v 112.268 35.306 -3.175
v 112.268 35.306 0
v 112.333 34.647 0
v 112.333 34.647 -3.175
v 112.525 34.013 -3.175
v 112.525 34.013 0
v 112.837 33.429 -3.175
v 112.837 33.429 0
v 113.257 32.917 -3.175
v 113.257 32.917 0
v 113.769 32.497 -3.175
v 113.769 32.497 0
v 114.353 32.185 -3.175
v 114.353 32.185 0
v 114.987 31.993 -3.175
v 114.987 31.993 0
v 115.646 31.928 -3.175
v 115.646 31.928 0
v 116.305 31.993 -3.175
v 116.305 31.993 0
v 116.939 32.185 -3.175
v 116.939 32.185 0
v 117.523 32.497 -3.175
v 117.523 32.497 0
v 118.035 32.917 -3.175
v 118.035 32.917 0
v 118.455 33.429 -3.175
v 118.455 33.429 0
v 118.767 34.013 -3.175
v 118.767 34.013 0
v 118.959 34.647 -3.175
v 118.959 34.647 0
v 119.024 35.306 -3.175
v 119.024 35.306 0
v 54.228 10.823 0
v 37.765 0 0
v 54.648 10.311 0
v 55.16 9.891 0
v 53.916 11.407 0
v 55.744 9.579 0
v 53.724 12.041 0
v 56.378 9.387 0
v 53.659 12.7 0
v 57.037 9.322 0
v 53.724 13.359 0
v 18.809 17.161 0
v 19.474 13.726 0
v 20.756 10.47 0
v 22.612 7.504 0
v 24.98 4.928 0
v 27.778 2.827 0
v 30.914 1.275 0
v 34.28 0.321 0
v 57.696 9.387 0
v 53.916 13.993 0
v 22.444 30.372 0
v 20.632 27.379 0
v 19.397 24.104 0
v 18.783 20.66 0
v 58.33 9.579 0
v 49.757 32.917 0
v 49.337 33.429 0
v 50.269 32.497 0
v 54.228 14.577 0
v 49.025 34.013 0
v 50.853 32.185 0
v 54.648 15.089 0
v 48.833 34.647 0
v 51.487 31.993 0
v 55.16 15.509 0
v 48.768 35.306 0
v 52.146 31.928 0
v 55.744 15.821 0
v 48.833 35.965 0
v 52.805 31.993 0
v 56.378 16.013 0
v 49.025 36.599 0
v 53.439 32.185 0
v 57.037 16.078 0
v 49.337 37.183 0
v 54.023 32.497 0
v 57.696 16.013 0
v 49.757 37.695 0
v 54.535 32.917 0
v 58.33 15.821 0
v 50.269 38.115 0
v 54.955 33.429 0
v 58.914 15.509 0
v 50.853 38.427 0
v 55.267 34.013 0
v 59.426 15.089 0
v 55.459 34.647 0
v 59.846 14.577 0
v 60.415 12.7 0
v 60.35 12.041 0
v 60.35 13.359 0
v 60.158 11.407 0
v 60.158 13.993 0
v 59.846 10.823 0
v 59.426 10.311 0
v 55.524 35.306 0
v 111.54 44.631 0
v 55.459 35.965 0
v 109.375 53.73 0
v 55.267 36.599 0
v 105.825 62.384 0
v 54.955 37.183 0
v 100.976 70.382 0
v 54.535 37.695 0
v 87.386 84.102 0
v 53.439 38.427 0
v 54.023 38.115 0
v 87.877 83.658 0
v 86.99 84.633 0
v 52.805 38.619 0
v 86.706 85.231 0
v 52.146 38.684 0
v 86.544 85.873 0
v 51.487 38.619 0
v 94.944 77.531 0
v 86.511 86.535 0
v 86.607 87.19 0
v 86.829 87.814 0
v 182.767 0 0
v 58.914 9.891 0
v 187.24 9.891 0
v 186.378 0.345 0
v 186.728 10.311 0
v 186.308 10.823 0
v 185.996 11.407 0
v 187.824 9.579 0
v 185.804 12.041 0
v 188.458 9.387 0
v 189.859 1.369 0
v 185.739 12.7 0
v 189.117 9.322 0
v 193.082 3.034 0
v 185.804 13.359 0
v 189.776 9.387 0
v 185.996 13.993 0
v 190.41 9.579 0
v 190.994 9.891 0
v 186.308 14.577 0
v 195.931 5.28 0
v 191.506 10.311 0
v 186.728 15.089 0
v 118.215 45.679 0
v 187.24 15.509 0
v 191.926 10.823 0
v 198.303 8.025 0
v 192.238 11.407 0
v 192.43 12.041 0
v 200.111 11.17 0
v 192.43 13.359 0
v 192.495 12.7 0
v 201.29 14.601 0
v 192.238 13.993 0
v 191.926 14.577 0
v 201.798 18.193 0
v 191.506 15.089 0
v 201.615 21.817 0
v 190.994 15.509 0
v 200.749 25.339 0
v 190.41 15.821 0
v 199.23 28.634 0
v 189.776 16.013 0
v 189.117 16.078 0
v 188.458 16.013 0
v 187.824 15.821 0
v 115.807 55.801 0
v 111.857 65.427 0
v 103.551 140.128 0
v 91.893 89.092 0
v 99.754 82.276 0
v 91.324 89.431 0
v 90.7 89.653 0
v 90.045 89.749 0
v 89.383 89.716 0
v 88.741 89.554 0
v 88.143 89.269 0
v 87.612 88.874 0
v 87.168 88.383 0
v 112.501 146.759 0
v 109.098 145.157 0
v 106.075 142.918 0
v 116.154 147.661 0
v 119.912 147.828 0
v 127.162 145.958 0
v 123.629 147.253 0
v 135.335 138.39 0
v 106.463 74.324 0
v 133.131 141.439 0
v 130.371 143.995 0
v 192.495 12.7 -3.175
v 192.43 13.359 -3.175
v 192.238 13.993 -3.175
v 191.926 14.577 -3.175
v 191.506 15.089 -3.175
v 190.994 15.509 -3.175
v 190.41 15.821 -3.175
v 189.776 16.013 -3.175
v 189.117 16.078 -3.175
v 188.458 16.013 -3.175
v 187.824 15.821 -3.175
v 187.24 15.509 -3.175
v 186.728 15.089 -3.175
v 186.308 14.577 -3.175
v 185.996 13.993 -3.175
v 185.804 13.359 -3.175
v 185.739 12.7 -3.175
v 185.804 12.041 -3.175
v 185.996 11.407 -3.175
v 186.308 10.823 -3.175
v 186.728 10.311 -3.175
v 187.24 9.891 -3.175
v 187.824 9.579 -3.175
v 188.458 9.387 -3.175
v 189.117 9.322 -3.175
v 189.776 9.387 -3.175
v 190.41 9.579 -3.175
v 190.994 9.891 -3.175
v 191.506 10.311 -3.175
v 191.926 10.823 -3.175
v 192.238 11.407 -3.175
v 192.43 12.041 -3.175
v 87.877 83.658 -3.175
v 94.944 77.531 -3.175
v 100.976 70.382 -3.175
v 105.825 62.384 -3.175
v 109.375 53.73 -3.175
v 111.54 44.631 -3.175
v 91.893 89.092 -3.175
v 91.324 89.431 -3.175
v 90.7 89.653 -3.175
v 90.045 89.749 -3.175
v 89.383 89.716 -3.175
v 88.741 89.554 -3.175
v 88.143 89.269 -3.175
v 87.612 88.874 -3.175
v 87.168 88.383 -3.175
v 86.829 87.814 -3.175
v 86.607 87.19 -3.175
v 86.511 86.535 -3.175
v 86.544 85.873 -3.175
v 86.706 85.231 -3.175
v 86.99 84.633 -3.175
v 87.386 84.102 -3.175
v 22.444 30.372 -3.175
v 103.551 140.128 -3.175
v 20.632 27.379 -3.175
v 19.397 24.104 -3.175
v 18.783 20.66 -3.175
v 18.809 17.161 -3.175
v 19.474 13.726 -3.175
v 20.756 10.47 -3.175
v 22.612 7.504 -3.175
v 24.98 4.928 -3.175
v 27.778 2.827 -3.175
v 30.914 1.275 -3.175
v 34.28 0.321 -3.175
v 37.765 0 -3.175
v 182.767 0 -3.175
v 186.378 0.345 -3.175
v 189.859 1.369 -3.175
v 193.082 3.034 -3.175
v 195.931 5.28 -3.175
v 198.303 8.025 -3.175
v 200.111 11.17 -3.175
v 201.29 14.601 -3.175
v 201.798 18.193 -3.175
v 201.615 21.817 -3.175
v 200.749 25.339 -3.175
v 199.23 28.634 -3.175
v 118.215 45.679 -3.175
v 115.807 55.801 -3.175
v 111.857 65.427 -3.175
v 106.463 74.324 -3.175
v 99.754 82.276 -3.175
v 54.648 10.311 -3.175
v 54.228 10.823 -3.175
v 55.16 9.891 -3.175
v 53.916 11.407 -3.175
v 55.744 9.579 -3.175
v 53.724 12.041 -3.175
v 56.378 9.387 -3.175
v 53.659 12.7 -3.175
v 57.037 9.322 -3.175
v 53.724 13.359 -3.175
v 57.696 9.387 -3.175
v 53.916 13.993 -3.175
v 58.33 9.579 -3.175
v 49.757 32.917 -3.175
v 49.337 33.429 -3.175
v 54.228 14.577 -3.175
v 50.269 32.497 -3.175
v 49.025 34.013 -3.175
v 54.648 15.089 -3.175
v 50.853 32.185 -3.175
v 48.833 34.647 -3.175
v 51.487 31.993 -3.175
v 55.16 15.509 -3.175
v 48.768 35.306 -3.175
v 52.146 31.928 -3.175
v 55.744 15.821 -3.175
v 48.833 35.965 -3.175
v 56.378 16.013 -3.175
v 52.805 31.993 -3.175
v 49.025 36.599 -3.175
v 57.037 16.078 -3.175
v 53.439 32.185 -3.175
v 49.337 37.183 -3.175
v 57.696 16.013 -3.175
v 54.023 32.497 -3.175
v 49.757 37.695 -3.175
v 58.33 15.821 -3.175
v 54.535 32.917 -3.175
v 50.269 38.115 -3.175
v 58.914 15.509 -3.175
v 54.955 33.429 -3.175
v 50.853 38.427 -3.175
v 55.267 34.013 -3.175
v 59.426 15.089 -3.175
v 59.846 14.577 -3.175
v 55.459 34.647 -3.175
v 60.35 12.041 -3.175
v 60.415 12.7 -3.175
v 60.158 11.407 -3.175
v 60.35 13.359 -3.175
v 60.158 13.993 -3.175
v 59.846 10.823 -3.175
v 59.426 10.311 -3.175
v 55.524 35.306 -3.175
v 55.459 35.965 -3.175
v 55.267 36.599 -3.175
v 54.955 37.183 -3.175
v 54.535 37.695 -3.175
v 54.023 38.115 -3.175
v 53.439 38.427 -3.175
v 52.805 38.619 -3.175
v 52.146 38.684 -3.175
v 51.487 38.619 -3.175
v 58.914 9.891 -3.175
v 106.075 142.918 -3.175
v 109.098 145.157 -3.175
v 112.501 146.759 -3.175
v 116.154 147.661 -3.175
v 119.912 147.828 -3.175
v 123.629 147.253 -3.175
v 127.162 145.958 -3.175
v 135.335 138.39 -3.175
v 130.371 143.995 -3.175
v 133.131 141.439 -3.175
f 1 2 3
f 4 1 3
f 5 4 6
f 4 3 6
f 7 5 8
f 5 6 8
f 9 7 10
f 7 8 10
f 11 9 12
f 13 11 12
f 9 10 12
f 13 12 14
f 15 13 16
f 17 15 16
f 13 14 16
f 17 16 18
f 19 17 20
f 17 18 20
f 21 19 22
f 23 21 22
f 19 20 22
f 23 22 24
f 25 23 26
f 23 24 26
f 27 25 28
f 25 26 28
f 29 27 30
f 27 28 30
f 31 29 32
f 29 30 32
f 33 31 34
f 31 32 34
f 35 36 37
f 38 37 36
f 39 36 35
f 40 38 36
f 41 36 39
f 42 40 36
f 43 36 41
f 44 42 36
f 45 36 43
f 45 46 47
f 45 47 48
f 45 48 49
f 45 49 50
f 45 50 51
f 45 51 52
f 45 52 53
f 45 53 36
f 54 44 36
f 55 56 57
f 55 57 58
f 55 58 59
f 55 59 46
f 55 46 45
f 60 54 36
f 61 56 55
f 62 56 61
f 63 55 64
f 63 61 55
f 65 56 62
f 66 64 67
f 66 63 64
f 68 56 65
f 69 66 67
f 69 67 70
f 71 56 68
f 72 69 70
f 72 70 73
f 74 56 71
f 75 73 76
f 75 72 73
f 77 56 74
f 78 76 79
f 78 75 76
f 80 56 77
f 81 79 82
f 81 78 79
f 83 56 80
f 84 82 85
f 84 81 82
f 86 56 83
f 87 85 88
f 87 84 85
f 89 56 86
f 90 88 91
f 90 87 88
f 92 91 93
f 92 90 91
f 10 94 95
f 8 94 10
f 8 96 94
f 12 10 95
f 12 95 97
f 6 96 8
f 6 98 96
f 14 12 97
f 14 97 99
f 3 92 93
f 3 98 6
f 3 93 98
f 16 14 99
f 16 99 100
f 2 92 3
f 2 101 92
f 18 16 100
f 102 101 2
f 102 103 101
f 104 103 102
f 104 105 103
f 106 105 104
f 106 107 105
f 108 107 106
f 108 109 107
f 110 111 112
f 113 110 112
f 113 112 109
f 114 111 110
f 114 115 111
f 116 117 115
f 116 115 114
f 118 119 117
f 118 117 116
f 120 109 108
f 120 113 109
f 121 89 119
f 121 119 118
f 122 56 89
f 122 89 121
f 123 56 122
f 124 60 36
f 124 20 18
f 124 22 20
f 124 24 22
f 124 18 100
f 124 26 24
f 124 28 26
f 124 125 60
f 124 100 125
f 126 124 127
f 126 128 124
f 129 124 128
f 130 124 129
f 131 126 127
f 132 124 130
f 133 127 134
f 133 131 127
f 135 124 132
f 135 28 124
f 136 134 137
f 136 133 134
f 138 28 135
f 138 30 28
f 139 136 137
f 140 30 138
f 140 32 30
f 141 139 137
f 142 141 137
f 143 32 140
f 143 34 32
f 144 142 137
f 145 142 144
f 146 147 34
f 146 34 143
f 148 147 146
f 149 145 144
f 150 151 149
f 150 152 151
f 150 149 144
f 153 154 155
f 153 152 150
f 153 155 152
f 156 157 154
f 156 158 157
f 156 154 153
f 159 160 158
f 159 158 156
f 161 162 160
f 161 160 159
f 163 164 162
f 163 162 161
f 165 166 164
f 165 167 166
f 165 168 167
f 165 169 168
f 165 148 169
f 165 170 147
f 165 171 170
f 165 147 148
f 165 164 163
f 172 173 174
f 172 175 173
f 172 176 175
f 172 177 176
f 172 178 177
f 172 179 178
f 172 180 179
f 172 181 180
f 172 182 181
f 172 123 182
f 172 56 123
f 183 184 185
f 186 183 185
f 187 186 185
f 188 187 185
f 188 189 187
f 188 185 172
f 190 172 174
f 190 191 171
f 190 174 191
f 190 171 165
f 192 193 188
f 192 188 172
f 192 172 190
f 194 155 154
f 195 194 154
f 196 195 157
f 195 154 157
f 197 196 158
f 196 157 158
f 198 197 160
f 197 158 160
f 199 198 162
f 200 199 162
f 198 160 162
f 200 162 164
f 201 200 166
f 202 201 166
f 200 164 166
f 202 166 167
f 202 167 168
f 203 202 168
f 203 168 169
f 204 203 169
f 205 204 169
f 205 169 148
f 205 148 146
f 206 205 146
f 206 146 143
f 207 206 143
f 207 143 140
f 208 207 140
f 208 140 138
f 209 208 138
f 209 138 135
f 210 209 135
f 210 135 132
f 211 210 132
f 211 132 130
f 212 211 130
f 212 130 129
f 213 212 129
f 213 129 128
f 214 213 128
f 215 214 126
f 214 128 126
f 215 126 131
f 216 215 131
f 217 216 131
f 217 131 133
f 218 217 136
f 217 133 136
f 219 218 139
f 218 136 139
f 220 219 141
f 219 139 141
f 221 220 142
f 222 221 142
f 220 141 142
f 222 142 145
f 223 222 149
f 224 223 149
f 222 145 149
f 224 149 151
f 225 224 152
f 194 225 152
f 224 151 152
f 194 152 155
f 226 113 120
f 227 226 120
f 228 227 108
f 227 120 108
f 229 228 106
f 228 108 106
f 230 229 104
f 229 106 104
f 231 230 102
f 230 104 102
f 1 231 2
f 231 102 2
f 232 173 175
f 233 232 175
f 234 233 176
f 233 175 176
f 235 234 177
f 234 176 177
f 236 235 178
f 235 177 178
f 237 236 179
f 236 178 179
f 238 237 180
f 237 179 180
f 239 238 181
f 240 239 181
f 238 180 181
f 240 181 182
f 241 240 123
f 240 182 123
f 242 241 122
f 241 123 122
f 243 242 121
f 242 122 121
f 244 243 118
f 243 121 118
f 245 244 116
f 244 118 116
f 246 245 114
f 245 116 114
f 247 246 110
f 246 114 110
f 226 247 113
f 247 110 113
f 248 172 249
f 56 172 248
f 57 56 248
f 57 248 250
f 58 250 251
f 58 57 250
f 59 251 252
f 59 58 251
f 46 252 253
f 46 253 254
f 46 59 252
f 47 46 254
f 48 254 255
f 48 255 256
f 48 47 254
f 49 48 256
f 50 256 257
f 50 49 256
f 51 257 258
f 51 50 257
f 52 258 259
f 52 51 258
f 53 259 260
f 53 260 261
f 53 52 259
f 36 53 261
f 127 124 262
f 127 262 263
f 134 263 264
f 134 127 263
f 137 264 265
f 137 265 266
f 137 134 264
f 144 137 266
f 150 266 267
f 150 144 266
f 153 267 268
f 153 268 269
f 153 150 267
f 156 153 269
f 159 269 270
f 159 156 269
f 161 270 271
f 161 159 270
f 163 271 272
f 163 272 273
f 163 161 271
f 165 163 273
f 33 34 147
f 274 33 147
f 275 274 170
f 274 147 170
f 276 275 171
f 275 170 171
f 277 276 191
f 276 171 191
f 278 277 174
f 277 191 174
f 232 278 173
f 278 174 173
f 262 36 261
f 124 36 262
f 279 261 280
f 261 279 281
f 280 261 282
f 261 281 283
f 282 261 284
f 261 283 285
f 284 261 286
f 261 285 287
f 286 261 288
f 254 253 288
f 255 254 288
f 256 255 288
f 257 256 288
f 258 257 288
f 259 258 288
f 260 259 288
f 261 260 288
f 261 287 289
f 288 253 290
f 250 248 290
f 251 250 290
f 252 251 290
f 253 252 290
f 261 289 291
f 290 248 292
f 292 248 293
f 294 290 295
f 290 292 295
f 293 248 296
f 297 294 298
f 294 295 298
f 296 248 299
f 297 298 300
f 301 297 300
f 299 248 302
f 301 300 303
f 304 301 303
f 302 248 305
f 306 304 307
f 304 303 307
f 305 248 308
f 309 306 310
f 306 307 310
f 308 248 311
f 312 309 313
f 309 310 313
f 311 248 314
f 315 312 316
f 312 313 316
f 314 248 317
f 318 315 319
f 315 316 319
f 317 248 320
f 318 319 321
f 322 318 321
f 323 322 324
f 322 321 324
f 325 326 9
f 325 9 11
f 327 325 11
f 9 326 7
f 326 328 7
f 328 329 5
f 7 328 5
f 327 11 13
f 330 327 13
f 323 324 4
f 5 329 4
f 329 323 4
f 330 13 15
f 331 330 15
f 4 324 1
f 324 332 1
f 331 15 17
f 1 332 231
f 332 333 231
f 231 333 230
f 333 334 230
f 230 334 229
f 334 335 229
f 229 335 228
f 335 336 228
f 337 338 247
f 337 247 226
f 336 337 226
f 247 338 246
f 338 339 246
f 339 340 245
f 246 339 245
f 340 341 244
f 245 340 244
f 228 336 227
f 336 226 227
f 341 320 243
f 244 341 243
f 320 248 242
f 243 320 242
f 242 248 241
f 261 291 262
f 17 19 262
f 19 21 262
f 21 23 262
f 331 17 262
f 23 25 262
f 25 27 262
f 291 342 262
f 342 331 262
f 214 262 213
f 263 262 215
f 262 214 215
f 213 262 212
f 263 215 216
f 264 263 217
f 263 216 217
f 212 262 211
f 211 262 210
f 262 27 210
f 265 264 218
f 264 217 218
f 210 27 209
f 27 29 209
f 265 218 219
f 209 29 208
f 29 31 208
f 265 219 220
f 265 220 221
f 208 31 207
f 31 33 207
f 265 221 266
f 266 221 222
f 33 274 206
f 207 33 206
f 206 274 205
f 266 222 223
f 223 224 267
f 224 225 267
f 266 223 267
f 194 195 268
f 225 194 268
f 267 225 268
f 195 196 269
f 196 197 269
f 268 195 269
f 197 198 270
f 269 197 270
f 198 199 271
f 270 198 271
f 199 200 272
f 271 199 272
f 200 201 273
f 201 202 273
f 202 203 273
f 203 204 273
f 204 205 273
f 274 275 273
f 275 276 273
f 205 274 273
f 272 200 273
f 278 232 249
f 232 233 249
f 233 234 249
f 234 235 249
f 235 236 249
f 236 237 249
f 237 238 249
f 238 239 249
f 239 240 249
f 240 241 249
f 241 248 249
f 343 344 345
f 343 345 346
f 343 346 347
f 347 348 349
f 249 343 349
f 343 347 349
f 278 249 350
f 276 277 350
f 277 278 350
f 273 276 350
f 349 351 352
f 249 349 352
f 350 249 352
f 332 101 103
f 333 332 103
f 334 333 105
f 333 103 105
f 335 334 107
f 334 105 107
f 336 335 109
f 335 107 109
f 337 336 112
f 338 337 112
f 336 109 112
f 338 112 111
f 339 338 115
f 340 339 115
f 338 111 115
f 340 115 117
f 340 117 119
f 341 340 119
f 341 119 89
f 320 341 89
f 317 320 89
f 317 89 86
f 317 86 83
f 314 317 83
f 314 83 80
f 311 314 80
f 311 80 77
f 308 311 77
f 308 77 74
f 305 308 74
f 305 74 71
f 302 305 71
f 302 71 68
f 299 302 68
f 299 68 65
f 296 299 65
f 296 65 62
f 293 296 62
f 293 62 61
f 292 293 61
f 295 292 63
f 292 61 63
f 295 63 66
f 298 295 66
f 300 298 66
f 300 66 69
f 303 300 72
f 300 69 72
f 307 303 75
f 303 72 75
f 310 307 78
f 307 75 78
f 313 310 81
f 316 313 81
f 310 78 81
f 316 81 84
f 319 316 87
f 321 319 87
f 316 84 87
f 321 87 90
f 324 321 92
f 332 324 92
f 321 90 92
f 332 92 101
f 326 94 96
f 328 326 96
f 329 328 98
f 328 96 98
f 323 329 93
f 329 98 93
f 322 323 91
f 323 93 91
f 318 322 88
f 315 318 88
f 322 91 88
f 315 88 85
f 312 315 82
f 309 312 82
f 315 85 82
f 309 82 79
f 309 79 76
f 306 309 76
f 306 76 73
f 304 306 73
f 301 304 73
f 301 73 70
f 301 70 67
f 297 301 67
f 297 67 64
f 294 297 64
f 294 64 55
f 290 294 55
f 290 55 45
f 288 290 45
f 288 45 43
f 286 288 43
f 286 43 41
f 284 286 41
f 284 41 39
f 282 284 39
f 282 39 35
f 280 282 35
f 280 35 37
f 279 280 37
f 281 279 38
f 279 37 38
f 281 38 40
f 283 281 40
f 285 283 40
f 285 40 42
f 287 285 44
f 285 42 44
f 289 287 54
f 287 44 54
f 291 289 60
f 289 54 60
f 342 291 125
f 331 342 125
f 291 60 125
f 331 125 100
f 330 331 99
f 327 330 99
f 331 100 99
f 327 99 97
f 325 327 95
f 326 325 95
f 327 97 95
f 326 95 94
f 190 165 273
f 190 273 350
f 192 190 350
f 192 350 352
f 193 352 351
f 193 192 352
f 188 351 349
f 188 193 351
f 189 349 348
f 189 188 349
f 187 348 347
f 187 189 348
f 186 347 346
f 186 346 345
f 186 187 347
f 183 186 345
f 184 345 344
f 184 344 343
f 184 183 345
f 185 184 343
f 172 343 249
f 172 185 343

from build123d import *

# Parameters (mm, degrees)
BASE_FLANGE1_DEPTH = 3.175
SKETCH6_R          = 3.3782
CUT_EXTRUDE1_DEPTH = 251.203228354
SKETCH7_R          = 3.3782
CUT_EXTRUDE2_DEPTH = 251.203228354


# Sheet-metal steps are written as plain solids
with BuildPart() as part:
    # Sketch1 → Base-Flange1 (new body)
    with BuildSketch(Plane.XY):
        with BuildLine():
            Line((37.764632708, 0), (182.767027516, 0))
            ThreePointArc((182.767027516, 0), (199.281906874, 9.554671686), (199.230460753, 28.63425094))
            Line((199.230460753, 28.63425094), (135.335454487, 138.390472515))
            ThreePointArc((135.335454487, 138.390472515), (119.911781029, 147.827825072), (103.551346546, 140.127856906))
            Line((103.551346546, 140.127856906), (22.443958003, 30.371635332))
            ThreePointArc((22.443958003, 30.371635332), (20.756110534, 10.470217167), (37.764632708, 0))
        make_face()
    extrude(amount=-BASE_FLANGE1_DEPTH)

    # Sketch6 → Cut-Extrude1 (cut, through all)
    with BuildSketch(Plane.XY):
        with Locations((52.14616343, 35.306)):
            Circle(SKETCH6_R)
        with BuildLine():
            ThreePointArc((119.02436343, 35.306), (111.857415274, 65.4267576), (91.892651201, 89.091781998))
            ThreePointArc((91.892651201, 89.091781998), (87.168081554, 88.382619016), (87.877244536, 83.658049369))
            ThreePointArc((87.877244536, 83.658049369), (105.82505941, 62.383794622), (112.26796343, 35.306))
            ThreePointArc((112.26796343, 35.306), (115.64616343, 31.9278), (119.02436343, 35.306))
        make_face()
    extrude(amount=-CUT_EXTRUDE1_DEPTH, mode=Mode.SUBTRACT)

    # Sketch7 → Cut-Extrude2 (cut, through all)
    with BuildSketch(Plane.XY):
        with Locations((57.037027516, 12.7)):
            Circle(SKETCH7_R)
        with Locations((189.117027516, 12.7)):
            Circle(SKETCH7_R)
    extrude(amount=-CUT_EXTRUDE2_DEPTH, mode=Mode.SUBTRACT)


solid = part.part
